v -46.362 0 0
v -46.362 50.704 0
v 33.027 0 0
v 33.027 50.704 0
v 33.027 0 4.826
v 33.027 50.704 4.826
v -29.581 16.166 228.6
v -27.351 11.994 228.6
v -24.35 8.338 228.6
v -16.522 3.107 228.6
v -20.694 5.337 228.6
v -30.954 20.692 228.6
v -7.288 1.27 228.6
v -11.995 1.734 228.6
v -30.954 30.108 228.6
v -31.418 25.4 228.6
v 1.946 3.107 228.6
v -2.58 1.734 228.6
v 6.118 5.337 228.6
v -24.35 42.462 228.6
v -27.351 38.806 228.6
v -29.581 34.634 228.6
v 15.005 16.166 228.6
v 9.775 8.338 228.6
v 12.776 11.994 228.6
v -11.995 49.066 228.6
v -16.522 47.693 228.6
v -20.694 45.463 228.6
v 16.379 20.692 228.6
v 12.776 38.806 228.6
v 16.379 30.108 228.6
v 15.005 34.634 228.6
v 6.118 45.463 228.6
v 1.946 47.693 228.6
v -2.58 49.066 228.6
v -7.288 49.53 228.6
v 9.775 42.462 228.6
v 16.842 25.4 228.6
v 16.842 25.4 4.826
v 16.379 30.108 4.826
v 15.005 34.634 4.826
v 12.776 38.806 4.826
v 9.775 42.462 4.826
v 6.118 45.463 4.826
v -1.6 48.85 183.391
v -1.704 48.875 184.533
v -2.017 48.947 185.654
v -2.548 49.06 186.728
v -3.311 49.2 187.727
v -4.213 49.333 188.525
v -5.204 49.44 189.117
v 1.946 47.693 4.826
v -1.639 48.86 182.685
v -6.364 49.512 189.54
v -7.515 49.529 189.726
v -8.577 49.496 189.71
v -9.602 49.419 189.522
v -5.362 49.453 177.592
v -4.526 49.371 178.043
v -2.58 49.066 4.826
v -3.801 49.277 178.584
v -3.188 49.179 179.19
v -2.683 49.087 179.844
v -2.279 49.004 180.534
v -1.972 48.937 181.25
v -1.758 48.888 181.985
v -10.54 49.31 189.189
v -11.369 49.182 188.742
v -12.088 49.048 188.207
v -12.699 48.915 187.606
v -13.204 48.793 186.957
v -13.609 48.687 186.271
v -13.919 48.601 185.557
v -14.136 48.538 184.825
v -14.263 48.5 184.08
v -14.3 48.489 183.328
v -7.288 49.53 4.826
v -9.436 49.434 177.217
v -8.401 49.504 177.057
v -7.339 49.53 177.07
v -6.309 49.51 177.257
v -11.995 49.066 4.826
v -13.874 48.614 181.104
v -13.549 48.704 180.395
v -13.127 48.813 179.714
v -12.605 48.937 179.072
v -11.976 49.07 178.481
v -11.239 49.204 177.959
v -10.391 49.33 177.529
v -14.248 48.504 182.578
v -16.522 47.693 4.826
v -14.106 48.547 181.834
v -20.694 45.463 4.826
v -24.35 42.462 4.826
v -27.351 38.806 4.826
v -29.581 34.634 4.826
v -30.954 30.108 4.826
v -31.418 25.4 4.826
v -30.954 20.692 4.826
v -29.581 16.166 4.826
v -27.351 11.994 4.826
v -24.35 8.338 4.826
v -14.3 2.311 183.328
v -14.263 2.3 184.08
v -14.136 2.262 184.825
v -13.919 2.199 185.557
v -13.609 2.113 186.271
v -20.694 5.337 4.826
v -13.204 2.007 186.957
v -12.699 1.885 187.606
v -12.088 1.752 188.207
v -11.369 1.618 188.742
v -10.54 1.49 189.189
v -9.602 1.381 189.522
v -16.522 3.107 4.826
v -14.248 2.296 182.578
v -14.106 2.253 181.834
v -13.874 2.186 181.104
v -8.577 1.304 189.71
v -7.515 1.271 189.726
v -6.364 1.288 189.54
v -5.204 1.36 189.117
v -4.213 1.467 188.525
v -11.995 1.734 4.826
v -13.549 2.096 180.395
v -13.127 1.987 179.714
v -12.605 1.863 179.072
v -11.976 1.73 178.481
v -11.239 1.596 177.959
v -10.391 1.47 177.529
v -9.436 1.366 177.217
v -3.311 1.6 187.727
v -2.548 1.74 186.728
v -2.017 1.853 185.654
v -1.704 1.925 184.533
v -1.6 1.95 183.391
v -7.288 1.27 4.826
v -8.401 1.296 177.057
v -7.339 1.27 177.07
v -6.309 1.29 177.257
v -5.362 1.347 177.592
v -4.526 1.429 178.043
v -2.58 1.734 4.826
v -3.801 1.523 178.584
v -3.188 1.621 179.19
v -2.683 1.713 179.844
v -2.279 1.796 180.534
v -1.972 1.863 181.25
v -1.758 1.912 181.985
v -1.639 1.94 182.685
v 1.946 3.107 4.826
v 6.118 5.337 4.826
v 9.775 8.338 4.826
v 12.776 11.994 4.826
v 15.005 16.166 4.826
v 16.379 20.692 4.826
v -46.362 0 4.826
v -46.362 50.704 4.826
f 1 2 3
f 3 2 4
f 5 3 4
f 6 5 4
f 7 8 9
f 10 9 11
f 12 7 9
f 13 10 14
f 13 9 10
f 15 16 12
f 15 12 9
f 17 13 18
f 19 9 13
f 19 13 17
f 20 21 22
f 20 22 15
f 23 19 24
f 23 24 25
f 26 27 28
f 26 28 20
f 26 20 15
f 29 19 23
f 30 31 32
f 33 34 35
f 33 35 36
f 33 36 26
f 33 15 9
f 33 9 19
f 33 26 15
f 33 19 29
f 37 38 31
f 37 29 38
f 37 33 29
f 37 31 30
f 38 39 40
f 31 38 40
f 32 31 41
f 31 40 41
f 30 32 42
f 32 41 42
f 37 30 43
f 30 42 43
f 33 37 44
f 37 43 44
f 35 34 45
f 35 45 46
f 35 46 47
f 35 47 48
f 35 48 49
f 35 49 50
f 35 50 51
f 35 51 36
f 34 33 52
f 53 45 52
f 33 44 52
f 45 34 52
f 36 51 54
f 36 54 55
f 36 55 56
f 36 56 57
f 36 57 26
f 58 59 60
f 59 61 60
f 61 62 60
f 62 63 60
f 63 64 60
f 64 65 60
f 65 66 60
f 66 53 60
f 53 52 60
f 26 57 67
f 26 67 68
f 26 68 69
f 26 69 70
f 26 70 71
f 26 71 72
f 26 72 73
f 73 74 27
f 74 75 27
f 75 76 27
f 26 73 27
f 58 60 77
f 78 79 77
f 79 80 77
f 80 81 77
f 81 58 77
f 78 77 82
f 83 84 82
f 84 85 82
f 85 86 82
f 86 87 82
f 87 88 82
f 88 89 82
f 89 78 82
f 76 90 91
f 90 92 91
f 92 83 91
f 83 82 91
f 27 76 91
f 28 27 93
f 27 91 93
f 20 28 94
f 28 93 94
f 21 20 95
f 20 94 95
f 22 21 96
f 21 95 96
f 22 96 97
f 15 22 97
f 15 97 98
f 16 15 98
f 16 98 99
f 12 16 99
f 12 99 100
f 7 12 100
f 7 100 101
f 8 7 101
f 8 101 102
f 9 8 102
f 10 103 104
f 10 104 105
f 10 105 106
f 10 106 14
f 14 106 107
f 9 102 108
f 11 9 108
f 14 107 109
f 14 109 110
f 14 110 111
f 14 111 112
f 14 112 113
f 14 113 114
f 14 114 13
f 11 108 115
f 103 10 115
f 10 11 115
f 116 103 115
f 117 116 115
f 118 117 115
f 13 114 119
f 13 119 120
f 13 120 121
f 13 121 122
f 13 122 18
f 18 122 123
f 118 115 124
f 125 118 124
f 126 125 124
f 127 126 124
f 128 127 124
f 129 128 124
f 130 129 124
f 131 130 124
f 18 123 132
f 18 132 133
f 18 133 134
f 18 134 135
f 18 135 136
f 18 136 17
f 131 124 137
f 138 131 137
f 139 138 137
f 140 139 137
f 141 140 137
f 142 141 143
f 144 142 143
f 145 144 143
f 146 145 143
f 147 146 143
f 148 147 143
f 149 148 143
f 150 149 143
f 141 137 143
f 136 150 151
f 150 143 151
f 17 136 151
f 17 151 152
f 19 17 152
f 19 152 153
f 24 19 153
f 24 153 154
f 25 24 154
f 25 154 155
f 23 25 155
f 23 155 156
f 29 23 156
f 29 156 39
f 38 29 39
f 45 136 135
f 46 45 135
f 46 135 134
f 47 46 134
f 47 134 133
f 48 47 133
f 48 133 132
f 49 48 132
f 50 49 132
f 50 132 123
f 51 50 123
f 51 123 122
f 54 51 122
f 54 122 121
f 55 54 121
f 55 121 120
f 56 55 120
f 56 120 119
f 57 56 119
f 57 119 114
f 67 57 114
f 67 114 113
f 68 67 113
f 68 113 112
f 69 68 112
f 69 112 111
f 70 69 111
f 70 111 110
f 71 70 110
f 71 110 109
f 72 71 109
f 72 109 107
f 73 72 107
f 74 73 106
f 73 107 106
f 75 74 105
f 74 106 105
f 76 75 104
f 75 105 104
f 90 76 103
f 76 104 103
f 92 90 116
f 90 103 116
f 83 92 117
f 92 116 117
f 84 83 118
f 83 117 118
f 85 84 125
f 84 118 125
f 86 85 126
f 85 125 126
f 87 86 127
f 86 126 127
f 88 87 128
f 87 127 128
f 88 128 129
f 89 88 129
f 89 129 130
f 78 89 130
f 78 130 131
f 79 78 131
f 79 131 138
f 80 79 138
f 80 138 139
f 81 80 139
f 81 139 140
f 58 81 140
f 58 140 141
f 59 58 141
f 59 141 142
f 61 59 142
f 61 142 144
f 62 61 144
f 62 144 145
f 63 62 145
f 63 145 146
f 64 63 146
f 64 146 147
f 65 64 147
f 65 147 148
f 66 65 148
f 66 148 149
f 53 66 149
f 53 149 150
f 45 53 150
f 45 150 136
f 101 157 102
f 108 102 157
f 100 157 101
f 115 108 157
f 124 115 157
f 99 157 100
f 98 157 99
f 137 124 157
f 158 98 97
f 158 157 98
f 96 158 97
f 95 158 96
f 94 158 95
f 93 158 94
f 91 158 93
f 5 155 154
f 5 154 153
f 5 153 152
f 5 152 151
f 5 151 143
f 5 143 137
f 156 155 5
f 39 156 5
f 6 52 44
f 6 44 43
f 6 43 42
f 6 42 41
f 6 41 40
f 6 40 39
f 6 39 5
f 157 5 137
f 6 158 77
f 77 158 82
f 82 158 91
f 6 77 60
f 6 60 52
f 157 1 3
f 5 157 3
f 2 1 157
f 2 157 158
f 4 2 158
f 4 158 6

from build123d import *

# Parameters (mm, degrees)
F0_R     = 24.13
F1_DEPTH = 228.6
F2_R     = 6.35
F3_DEPTH = 66.294
F4_W     = 79.389766
F4_H     = 50.704014
F5_DEPTH = 4.826


with BuildPart() as f1:
    # F0 (on Top) → F1 (new body)
    with BuildSketch(Plane.XY):
        with Locations((-7.287733, 25.4)):
            Circle(F0_R)
    extrude(amount=F1_DEPTH)

    # F2 (on Front) → F3 (cut)
    with BuildSketch(Plane.XZ):
        with Locations((-7.949968, 183.391028)):
            Circle(F2_R)
    extrude(amount=-F3_DEPTH, mode=Mode.SUBTRACT)

    # F4 (on Top) → F5 (join)
    with BuildSketch(Plane.XY):
        with Locations((-6.667502, 25.352007)):
            Rectangle(F4_W, F4_H)
    extrude(amount=F5_DEPTH)


solid = f1.part
